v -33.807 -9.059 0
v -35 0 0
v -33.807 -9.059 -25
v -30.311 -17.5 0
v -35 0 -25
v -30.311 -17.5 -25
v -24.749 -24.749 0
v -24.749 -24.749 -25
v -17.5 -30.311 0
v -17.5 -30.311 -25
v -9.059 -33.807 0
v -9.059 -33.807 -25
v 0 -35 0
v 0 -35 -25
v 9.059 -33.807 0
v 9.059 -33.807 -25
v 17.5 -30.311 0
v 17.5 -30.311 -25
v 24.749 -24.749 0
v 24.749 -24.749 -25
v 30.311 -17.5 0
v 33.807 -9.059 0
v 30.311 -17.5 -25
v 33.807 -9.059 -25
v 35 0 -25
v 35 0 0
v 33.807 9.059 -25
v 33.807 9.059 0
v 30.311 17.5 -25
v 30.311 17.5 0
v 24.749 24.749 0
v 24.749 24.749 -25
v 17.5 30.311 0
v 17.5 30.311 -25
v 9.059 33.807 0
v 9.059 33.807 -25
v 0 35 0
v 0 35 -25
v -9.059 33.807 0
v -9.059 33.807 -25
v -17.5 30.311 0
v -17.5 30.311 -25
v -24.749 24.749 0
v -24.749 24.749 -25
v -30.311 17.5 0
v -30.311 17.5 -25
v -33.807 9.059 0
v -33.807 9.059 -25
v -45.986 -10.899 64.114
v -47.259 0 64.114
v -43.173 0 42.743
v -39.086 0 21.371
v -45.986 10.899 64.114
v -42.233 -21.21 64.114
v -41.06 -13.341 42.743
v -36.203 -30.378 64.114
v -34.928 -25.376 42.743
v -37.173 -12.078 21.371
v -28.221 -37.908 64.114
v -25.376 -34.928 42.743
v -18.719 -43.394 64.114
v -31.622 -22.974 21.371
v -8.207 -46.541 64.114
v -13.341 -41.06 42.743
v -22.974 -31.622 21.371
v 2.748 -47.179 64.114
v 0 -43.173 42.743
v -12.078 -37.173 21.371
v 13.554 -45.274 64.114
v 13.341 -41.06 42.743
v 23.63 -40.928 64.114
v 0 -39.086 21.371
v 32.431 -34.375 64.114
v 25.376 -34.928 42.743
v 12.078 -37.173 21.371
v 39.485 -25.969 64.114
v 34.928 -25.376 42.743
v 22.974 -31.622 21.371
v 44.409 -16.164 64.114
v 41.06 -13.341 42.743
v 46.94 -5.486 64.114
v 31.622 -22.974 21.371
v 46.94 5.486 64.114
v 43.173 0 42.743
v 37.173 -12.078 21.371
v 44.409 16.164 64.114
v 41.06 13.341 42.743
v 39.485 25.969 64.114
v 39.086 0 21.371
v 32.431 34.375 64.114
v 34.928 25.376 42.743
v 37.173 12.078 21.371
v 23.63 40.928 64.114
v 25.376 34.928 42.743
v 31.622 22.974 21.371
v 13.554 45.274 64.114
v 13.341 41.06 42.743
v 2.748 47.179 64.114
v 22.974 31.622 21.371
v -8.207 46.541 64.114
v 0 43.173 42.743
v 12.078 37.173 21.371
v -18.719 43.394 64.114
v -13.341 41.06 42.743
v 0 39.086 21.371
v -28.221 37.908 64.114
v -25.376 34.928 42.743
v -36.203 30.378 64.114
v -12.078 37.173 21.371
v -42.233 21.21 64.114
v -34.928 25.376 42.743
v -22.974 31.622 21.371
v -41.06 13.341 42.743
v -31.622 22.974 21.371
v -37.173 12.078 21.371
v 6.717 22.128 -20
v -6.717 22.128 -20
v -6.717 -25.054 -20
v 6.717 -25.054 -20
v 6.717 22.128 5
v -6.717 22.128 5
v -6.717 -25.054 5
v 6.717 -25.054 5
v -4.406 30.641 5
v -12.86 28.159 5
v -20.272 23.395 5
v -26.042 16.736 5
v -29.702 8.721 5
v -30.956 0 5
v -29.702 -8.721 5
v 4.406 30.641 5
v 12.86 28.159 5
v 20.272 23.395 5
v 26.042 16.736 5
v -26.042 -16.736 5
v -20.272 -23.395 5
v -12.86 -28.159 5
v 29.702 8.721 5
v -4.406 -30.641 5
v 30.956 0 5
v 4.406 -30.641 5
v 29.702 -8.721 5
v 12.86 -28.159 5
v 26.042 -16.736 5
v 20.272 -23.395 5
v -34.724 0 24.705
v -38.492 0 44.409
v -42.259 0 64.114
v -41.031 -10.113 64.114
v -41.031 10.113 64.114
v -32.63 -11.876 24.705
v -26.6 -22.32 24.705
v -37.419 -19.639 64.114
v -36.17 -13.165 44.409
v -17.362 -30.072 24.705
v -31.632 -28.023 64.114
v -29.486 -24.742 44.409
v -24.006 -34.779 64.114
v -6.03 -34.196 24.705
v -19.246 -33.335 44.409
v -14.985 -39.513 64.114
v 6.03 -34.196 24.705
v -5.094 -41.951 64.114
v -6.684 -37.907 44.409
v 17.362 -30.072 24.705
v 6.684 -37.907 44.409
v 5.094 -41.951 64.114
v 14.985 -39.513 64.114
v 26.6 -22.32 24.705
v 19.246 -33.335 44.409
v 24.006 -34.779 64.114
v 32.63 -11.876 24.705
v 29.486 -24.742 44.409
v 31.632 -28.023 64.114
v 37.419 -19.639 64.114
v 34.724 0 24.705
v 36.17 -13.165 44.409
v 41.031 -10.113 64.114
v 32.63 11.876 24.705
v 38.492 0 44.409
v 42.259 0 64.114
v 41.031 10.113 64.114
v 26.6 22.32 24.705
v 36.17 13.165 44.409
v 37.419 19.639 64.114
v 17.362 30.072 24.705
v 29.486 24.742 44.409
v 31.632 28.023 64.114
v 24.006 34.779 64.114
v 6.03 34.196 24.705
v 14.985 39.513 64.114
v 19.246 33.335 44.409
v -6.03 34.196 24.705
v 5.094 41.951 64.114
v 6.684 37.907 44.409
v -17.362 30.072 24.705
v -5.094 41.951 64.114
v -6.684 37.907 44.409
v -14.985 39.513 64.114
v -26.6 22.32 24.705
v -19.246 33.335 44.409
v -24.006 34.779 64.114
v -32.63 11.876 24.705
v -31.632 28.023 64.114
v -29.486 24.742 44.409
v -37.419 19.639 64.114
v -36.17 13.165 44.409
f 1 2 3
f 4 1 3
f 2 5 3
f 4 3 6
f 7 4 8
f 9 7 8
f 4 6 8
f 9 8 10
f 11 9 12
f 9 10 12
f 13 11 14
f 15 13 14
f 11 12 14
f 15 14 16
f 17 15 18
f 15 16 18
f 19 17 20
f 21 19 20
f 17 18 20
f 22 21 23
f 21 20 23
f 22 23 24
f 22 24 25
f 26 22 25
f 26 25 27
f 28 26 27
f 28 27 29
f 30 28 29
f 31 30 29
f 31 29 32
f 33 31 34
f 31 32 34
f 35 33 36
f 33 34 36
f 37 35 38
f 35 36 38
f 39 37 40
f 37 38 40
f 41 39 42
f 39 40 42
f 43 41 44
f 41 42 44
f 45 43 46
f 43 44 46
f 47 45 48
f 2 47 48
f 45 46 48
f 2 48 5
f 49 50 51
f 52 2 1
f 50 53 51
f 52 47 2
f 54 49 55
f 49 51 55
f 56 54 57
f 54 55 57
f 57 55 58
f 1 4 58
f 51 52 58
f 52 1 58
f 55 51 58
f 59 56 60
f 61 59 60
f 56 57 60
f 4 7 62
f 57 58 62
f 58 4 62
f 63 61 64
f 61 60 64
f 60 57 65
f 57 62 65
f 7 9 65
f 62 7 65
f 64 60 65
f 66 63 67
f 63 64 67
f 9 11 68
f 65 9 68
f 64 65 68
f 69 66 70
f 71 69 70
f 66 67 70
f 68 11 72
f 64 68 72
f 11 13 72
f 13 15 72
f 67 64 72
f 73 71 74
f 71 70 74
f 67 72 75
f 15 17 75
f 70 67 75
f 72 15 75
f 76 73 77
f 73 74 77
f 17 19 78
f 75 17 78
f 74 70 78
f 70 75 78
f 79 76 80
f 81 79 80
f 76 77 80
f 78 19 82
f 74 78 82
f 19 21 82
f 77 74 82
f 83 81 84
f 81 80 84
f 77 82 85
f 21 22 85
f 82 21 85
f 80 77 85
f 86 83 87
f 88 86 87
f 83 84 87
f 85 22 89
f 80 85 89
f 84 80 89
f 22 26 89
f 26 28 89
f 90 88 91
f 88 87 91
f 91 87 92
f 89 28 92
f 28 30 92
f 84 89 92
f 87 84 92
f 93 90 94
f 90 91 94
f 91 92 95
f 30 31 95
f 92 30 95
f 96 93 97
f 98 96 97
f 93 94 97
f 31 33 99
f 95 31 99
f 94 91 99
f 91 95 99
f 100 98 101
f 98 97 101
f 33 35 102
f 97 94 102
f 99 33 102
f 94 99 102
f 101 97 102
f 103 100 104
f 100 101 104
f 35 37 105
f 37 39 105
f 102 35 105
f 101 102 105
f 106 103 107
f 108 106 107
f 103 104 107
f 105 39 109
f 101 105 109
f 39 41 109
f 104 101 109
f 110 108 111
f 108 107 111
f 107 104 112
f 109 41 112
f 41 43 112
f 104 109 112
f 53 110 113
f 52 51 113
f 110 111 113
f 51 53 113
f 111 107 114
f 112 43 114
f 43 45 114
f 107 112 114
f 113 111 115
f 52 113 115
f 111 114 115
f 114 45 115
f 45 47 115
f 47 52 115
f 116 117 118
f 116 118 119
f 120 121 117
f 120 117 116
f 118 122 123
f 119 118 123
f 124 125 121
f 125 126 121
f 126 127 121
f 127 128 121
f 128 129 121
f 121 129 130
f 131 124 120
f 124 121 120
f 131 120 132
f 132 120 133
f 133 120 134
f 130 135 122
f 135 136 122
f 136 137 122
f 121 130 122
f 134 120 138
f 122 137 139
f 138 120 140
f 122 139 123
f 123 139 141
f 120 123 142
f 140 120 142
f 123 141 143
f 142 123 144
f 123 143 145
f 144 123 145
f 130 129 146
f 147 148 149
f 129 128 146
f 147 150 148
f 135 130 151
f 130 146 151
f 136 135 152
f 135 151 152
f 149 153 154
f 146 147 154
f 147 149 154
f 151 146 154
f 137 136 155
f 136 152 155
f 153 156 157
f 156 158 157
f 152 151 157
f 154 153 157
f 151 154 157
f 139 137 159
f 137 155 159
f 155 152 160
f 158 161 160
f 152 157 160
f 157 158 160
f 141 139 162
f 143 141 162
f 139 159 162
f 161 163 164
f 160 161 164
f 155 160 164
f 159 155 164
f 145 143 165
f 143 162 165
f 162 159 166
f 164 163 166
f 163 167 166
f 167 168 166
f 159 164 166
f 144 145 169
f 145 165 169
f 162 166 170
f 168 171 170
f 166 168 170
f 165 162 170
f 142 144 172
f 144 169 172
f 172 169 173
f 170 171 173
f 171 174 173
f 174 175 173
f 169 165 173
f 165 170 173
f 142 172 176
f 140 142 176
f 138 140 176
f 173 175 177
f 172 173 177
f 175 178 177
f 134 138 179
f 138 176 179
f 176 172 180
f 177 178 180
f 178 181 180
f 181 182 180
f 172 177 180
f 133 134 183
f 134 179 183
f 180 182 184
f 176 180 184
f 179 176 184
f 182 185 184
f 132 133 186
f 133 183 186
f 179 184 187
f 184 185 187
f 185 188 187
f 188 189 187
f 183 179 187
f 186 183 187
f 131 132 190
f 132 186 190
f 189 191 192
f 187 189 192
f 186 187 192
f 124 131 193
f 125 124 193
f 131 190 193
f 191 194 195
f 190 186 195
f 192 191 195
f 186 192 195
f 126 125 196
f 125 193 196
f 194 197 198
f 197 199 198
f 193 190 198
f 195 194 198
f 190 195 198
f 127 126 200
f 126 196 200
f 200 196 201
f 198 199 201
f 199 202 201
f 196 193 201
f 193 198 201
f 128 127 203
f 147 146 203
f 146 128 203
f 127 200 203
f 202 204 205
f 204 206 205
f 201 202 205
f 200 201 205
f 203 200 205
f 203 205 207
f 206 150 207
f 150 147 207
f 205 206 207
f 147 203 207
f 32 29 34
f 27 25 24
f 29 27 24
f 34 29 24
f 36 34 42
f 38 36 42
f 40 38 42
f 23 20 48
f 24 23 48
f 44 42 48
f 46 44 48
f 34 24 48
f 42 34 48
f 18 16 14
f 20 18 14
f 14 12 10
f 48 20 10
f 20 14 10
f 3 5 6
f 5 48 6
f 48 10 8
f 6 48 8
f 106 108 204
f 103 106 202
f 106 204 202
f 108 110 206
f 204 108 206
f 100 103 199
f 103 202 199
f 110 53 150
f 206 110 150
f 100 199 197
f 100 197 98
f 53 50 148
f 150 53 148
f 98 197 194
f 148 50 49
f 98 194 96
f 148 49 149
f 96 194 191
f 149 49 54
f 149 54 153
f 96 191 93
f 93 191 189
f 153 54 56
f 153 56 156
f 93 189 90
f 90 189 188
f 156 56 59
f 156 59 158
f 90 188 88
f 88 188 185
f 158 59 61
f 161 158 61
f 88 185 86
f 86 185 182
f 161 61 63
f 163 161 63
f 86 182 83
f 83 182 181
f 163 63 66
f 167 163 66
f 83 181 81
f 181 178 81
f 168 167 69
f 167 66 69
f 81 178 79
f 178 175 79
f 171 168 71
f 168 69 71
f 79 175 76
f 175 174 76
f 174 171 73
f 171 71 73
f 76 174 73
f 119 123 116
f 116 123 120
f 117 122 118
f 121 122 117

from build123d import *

# Parameters (mm, degrees)
F2_W     = 13.43354
F2_H     = 47.182618
F3_DEPTH = 25


with BuildPart() as f1:
    # F0 (on Front) → F1 (revolve)
    with BuildSketch(Plane.XZ):
        Polygon((-42.259444, 64.114208), (-47.259444, 64.114208), (-35, 0), (-35, -25), (0, -25), (0, 0), (0, 5), (-30.956063, 5), align=None)
    revolve(axis=Axis((0, 0, -12.5), (0, 0, 1)))

    # F2 (on face) → F3 (cut)
    with BuildSketch(Plane.XY.offset(5)):
        with Locations((0, -1.463118)):
            Rectangle(F2_W, F2_H)
    extrude(amount=-F3_DEPTH, mode=Mode.SUBTRACT)


solid = f1.part
